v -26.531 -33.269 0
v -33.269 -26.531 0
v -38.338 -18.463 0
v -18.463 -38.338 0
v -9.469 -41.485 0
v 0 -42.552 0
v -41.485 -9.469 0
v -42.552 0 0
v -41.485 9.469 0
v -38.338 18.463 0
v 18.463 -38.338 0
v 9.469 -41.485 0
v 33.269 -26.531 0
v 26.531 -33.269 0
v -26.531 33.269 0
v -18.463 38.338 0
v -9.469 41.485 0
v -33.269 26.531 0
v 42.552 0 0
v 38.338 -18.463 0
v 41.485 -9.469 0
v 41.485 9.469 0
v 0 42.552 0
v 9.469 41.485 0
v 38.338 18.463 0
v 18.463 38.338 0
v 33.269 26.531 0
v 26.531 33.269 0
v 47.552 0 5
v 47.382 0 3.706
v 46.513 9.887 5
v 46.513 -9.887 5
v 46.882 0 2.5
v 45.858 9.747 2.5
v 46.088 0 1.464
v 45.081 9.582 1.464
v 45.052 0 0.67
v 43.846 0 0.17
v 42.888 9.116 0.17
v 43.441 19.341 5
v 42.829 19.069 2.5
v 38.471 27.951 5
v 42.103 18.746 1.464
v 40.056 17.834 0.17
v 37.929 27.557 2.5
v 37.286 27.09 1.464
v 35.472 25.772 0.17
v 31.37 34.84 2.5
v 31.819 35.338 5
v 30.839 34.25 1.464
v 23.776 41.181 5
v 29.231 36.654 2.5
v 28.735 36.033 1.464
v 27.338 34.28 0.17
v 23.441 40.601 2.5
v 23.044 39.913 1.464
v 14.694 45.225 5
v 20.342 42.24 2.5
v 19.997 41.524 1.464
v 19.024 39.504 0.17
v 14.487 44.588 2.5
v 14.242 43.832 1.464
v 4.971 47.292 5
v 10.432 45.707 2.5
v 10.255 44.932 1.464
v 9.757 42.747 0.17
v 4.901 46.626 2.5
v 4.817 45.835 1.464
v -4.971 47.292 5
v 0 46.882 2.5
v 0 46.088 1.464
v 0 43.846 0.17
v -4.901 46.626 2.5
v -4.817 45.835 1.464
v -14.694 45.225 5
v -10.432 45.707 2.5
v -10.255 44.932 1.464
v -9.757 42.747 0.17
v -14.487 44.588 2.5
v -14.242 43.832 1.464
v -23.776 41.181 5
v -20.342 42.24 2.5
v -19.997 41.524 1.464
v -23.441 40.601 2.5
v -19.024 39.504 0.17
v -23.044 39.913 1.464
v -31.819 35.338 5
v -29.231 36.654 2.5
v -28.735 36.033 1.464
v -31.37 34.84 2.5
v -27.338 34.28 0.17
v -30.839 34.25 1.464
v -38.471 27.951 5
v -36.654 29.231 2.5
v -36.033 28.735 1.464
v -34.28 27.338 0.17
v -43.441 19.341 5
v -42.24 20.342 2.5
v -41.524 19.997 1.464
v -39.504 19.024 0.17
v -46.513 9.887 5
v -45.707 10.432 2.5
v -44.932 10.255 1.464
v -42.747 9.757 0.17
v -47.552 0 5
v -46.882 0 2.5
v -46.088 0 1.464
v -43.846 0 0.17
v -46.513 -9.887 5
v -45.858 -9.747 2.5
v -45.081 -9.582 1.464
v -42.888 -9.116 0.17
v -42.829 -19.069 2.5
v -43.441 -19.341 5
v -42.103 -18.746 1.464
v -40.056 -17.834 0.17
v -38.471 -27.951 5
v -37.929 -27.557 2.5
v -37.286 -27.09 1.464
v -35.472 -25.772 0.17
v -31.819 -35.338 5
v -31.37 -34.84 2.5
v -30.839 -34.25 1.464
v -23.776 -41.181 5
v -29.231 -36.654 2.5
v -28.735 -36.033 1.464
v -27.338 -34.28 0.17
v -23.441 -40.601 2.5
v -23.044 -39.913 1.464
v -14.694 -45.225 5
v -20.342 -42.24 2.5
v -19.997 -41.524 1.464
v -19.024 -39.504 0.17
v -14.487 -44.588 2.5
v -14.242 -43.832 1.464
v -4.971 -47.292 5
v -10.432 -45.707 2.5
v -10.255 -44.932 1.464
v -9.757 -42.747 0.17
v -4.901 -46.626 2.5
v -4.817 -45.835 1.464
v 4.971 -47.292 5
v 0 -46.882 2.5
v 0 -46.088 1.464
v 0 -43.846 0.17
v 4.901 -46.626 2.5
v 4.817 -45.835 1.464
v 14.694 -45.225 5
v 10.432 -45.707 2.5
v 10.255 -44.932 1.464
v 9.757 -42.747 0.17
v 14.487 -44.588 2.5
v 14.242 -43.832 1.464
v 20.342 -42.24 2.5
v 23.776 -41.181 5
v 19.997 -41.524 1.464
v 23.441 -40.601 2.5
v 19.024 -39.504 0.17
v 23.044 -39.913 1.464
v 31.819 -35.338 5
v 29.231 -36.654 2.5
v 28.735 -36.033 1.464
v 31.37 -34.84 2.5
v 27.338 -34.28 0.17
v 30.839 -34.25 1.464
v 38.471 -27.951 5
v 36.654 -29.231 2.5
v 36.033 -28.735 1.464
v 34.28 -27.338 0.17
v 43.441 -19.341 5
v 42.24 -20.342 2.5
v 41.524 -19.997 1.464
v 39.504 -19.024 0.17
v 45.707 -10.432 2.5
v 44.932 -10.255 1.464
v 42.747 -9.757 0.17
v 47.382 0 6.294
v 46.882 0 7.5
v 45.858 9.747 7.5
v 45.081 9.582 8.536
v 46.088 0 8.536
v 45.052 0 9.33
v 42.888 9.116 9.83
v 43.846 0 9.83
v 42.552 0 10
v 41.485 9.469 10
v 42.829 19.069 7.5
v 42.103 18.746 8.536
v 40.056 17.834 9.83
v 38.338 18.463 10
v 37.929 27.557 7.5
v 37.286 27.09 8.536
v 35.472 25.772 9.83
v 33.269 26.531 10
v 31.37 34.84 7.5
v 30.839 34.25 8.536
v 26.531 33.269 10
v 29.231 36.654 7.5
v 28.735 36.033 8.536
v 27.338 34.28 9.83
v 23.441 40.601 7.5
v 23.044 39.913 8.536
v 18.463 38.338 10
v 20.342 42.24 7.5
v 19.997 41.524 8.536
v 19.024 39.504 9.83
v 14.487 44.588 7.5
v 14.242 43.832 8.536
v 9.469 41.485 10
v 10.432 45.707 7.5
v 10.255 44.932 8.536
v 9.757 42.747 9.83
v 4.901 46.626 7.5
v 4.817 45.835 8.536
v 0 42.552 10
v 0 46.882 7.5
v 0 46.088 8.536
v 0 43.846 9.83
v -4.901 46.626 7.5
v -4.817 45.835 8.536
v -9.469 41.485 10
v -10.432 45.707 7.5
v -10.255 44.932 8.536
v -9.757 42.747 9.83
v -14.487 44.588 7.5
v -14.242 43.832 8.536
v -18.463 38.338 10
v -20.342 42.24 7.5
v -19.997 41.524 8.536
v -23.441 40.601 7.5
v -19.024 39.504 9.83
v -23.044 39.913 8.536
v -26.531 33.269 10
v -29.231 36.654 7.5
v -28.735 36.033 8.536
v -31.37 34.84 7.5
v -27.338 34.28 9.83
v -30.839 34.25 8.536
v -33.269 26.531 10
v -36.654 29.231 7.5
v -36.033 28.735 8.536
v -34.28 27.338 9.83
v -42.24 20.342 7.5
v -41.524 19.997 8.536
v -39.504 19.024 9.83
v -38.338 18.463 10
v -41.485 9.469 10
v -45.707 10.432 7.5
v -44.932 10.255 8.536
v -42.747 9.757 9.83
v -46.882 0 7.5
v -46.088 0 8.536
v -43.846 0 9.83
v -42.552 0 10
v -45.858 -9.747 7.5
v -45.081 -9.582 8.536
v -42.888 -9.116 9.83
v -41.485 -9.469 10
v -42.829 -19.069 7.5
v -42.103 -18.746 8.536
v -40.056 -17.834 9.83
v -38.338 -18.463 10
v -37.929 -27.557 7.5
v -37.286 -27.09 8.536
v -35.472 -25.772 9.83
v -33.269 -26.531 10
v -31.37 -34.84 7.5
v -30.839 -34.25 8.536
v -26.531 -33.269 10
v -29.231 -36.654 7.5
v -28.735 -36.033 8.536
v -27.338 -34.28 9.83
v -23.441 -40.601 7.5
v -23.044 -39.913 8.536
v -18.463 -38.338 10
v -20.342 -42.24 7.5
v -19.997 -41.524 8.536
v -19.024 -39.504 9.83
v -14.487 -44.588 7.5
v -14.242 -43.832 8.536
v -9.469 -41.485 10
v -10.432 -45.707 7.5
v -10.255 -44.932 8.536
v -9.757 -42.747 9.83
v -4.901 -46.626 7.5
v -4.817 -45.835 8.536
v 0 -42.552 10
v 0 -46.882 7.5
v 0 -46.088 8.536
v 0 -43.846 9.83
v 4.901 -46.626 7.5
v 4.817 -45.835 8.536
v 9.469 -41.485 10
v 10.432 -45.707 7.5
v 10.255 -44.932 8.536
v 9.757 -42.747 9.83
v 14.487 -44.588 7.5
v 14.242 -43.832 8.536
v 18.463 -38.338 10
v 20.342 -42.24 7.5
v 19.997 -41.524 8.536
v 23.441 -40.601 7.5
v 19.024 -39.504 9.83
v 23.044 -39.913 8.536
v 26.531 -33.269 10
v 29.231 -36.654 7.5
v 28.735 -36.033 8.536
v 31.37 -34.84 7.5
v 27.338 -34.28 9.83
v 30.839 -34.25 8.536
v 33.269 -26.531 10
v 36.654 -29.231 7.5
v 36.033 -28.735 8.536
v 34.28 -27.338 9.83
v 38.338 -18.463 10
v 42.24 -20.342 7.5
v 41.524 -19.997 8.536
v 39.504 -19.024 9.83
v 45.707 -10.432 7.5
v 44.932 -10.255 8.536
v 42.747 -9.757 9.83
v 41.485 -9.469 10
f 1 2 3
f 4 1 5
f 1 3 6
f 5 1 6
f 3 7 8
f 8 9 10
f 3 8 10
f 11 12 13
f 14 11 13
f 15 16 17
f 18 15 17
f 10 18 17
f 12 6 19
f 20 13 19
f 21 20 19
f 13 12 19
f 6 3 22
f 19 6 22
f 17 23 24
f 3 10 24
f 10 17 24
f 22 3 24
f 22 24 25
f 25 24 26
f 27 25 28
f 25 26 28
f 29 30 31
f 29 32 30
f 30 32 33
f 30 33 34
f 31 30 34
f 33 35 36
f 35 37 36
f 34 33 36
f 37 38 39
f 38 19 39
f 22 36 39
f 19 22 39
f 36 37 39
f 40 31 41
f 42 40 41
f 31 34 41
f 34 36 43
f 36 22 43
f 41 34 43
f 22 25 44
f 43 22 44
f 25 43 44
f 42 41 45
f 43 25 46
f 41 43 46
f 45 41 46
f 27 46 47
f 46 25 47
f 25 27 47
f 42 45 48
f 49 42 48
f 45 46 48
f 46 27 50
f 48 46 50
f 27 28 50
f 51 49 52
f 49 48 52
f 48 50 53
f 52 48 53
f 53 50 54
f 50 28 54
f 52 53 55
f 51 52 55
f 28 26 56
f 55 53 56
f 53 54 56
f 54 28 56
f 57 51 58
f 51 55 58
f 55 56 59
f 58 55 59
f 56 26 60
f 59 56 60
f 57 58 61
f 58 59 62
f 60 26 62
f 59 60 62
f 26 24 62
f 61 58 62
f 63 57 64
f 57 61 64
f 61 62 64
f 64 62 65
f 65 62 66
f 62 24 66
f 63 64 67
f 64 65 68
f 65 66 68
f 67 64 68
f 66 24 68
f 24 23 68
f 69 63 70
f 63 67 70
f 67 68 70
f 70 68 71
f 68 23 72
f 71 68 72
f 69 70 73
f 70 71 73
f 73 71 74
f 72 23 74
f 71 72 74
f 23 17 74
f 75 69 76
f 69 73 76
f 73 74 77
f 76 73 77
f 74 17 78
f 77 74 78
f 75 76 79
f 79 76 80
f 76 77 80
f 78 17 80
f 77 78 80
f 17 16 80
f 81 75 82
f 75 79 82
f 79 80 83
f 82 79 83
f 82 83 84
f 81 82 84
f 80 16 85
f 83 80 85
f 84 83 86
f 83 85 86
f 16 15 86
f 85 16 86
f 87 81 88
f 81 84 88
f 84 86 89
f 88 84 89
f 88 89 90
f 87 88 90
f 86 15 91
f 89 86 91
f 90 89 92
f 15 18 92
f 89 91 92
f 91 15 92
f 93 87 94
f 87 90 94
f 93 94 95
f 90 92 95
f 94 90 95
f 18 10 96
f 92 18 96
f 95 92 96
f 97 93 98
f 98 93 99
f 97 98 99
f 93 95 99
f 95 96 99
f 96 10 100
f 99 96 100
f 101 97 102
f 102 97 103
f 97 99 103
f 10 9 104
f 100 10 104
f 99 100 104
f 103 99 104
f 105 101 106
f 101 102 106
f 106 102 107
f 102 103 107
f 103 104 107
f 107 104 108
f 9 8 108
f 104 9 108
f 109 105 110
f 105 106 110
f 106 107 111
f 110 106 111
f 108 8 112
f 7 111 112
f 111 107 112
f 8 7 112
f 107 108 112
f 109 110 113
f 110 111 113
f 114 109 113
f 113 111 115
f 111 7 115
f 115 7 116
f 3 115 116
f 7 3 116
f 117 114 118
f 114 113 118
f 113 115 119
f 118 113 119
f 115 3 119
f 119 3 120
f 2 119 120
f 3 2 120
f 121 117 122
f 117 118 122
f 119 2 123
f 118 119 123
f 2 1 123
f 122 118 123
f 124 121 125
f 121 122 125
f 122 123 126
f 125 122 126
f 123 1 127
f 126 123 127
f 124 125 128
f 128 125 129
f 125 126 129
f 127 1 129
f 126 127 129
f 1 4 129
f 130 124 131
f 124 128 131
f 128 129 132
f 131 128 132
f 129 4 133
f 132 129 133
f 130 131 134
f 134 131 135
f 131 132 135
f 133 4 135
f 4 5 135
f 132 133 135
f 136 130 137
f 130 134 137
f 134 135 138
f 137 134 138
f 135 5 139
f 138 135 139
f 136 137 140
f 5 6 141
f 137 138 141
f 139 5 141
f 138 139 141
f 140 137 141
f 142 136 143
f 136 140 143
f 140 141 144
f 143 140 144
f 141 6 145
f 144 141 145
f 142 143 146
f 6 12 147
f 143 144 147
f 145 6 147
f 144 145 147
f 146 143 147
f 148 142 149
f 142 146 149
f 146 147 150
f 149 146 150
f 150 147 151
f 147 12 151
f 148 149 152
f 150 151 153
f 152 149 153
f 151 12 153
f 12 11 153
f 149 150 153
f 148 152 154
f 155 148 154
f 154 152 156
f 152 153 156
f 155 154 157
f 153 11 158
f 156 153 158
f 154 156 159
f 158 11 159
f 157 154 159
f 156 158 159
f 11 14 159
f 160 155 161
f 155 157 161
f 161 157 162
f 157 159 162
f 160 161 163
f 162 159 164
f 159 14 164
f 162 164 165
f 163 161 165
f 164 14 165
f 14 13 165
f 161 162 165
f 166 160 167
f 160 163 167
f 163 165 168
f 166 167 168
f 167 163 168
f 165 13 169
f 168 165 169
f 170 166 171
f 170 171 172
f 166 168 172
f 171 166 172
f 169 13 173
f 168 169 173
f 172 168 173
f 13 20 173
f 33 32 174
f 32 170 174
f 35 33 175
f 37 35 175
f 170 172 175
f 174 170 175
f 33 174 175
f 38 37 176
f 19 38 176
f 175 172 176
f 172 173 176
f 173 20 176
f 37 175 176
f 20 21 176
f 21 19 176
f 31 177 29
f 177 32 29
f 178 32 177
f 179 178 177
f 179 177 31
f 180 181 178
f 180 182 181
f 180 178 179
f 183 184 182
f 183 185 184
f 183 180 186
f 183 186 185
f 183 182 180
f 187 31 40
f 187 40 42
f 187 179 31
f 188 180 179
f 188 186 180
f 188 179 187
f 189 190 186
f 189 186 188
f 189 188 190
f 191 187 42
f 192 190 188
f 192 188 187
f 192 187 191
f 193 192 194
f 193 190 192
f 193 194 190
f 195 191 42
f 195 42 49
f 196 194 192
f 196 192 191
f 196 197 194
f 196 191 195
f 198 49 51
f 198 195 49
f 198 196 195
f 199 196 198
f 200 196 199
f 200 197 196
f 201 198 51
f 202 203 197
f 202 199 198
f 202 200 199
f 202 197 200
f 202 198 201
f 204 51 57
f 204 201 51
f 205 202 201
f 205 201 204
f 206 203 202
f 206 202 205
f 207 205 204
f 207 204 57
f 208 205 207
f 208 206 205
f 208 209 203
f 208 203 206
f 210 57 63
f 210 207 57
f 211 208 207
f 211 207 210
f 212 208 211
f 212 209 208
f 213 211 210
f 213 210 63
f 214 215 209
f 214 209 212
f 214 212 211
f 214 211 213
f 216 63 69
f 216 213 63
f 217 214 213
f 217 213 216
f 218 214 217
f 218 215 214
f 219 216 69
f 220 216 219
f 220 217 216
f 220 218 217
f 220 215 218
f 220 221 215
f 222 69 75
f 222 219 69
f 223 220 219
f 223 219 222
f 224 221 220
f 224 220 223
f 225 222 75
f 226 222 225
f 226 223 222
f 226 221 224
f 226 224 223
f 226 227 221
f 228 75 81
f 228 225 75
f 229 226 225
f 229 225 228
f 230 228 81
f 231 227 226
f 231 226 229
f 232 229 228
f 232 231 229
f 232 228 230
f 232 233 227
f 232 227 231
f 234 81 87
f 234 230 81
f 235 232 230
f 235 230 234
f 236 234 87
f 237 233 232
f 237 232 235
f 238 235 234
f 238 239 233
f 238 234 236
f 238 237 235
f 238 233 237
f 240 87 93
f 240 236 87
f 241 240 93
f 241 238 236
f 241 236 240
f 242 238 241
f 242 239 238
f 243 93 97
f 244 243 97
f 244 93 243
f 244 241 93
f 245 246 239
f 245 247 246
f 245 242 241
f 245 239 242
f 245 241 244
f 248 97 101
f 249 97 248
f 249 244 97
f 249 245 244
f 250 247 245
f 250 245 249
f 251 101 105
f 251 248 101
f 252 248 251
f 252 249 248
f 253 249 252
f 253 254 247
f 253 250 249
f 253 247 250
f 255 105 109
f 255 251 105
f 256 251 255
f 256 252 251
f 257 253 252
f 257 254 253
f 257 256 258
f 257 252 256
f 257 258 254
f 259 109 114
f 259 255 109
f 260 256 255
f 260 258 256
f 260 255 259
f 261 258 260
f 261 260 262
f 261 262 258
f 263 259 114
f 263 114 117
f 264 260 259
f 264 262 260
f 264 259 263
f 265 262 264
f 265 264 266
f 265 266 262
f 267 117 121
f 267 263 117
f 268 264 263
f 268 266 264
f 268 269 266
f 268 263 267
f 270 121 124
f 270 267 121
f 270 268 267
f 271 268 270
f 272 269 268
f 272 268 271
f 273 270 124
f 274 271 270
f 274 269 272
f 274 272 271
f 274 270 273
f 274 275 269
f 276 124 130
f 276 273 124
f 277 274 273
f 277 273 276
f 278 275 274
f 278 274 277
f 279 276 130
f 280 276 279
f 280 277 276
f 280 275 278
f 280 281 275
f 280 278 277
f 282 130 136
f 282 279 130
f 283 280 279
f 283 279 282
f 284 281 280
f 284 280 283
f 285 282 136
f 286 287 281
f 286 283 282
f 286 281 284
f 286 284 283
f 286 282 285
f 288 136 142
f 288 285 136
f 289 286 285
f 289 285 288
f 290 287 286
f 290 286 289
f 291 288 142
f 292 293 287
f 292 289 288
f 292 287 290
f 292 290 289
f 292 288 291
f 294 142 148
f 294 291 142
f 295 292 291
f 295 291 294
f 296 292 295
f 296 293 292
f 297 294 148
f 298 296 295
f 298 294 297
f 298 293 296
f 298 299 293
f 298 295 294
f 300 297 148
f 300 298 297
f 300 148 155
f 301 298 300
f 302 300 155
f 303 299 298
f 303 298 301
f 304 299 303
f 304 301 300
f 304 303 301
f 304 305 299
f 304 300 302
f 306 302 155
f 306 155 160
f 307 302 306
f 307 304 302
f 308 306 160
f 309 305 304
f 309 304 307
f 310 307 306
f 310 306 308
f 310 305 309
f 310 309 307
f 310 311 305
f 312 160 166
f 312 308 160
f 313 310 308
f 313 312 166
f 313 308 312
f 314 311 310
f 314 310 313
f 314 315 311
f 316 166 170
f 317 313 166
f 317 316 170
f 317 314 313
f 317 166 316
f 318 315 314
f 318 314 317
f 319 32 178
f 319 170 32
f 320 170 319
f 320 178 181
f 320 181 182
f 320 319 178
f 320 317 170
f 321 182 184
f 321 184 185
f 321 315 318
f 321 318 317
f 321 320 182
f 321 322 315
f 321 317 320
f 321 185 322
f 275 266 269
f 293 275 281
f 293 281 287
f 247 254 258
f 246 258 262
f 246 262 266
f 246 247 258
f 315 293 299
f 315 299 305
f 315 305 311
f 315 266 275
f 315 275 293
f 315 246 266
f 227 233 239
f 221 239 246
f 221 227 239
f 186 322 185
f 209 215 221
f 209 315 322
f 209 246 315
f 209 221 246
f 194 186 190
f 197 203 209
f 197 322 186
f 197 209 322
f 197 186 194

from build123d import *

# Parameters (mm, degrees)
F0_R     = 47.5522600406
F1_DEPTH = 10
F2_R     = 5
F3_R     = 4.99999


# Not quite as in the source:
# - a fillet or chamfer is up to 0.001 mm smaller than in the source, because OpenCascade refuses the exact size


with BuildPart() as f1:
    # F0 (on Top) → F1 (new body)
    with BuildSketch(Plane.XY):
        Circle(F0_R)
    extrude(amount=F1_DEPTH)

    # F2
    f2_edges = [f1.edges().sort_by_distance(p)[0] for p in [
        (-47.55226, 0, 10),
    ]]
    fillet(f2_edges, radius=F2_R)

    # F3 (radius 5 in the source; OpenCascade refuses exactly that, so slightly less here)
    f3_edges = [f1.edges().sort_by_distance(p)[0] for p in [
        (-47.55226, 0, 0),
    ]]
    fillet(f3_edges, radius=F3_R)


solid = f1.part
